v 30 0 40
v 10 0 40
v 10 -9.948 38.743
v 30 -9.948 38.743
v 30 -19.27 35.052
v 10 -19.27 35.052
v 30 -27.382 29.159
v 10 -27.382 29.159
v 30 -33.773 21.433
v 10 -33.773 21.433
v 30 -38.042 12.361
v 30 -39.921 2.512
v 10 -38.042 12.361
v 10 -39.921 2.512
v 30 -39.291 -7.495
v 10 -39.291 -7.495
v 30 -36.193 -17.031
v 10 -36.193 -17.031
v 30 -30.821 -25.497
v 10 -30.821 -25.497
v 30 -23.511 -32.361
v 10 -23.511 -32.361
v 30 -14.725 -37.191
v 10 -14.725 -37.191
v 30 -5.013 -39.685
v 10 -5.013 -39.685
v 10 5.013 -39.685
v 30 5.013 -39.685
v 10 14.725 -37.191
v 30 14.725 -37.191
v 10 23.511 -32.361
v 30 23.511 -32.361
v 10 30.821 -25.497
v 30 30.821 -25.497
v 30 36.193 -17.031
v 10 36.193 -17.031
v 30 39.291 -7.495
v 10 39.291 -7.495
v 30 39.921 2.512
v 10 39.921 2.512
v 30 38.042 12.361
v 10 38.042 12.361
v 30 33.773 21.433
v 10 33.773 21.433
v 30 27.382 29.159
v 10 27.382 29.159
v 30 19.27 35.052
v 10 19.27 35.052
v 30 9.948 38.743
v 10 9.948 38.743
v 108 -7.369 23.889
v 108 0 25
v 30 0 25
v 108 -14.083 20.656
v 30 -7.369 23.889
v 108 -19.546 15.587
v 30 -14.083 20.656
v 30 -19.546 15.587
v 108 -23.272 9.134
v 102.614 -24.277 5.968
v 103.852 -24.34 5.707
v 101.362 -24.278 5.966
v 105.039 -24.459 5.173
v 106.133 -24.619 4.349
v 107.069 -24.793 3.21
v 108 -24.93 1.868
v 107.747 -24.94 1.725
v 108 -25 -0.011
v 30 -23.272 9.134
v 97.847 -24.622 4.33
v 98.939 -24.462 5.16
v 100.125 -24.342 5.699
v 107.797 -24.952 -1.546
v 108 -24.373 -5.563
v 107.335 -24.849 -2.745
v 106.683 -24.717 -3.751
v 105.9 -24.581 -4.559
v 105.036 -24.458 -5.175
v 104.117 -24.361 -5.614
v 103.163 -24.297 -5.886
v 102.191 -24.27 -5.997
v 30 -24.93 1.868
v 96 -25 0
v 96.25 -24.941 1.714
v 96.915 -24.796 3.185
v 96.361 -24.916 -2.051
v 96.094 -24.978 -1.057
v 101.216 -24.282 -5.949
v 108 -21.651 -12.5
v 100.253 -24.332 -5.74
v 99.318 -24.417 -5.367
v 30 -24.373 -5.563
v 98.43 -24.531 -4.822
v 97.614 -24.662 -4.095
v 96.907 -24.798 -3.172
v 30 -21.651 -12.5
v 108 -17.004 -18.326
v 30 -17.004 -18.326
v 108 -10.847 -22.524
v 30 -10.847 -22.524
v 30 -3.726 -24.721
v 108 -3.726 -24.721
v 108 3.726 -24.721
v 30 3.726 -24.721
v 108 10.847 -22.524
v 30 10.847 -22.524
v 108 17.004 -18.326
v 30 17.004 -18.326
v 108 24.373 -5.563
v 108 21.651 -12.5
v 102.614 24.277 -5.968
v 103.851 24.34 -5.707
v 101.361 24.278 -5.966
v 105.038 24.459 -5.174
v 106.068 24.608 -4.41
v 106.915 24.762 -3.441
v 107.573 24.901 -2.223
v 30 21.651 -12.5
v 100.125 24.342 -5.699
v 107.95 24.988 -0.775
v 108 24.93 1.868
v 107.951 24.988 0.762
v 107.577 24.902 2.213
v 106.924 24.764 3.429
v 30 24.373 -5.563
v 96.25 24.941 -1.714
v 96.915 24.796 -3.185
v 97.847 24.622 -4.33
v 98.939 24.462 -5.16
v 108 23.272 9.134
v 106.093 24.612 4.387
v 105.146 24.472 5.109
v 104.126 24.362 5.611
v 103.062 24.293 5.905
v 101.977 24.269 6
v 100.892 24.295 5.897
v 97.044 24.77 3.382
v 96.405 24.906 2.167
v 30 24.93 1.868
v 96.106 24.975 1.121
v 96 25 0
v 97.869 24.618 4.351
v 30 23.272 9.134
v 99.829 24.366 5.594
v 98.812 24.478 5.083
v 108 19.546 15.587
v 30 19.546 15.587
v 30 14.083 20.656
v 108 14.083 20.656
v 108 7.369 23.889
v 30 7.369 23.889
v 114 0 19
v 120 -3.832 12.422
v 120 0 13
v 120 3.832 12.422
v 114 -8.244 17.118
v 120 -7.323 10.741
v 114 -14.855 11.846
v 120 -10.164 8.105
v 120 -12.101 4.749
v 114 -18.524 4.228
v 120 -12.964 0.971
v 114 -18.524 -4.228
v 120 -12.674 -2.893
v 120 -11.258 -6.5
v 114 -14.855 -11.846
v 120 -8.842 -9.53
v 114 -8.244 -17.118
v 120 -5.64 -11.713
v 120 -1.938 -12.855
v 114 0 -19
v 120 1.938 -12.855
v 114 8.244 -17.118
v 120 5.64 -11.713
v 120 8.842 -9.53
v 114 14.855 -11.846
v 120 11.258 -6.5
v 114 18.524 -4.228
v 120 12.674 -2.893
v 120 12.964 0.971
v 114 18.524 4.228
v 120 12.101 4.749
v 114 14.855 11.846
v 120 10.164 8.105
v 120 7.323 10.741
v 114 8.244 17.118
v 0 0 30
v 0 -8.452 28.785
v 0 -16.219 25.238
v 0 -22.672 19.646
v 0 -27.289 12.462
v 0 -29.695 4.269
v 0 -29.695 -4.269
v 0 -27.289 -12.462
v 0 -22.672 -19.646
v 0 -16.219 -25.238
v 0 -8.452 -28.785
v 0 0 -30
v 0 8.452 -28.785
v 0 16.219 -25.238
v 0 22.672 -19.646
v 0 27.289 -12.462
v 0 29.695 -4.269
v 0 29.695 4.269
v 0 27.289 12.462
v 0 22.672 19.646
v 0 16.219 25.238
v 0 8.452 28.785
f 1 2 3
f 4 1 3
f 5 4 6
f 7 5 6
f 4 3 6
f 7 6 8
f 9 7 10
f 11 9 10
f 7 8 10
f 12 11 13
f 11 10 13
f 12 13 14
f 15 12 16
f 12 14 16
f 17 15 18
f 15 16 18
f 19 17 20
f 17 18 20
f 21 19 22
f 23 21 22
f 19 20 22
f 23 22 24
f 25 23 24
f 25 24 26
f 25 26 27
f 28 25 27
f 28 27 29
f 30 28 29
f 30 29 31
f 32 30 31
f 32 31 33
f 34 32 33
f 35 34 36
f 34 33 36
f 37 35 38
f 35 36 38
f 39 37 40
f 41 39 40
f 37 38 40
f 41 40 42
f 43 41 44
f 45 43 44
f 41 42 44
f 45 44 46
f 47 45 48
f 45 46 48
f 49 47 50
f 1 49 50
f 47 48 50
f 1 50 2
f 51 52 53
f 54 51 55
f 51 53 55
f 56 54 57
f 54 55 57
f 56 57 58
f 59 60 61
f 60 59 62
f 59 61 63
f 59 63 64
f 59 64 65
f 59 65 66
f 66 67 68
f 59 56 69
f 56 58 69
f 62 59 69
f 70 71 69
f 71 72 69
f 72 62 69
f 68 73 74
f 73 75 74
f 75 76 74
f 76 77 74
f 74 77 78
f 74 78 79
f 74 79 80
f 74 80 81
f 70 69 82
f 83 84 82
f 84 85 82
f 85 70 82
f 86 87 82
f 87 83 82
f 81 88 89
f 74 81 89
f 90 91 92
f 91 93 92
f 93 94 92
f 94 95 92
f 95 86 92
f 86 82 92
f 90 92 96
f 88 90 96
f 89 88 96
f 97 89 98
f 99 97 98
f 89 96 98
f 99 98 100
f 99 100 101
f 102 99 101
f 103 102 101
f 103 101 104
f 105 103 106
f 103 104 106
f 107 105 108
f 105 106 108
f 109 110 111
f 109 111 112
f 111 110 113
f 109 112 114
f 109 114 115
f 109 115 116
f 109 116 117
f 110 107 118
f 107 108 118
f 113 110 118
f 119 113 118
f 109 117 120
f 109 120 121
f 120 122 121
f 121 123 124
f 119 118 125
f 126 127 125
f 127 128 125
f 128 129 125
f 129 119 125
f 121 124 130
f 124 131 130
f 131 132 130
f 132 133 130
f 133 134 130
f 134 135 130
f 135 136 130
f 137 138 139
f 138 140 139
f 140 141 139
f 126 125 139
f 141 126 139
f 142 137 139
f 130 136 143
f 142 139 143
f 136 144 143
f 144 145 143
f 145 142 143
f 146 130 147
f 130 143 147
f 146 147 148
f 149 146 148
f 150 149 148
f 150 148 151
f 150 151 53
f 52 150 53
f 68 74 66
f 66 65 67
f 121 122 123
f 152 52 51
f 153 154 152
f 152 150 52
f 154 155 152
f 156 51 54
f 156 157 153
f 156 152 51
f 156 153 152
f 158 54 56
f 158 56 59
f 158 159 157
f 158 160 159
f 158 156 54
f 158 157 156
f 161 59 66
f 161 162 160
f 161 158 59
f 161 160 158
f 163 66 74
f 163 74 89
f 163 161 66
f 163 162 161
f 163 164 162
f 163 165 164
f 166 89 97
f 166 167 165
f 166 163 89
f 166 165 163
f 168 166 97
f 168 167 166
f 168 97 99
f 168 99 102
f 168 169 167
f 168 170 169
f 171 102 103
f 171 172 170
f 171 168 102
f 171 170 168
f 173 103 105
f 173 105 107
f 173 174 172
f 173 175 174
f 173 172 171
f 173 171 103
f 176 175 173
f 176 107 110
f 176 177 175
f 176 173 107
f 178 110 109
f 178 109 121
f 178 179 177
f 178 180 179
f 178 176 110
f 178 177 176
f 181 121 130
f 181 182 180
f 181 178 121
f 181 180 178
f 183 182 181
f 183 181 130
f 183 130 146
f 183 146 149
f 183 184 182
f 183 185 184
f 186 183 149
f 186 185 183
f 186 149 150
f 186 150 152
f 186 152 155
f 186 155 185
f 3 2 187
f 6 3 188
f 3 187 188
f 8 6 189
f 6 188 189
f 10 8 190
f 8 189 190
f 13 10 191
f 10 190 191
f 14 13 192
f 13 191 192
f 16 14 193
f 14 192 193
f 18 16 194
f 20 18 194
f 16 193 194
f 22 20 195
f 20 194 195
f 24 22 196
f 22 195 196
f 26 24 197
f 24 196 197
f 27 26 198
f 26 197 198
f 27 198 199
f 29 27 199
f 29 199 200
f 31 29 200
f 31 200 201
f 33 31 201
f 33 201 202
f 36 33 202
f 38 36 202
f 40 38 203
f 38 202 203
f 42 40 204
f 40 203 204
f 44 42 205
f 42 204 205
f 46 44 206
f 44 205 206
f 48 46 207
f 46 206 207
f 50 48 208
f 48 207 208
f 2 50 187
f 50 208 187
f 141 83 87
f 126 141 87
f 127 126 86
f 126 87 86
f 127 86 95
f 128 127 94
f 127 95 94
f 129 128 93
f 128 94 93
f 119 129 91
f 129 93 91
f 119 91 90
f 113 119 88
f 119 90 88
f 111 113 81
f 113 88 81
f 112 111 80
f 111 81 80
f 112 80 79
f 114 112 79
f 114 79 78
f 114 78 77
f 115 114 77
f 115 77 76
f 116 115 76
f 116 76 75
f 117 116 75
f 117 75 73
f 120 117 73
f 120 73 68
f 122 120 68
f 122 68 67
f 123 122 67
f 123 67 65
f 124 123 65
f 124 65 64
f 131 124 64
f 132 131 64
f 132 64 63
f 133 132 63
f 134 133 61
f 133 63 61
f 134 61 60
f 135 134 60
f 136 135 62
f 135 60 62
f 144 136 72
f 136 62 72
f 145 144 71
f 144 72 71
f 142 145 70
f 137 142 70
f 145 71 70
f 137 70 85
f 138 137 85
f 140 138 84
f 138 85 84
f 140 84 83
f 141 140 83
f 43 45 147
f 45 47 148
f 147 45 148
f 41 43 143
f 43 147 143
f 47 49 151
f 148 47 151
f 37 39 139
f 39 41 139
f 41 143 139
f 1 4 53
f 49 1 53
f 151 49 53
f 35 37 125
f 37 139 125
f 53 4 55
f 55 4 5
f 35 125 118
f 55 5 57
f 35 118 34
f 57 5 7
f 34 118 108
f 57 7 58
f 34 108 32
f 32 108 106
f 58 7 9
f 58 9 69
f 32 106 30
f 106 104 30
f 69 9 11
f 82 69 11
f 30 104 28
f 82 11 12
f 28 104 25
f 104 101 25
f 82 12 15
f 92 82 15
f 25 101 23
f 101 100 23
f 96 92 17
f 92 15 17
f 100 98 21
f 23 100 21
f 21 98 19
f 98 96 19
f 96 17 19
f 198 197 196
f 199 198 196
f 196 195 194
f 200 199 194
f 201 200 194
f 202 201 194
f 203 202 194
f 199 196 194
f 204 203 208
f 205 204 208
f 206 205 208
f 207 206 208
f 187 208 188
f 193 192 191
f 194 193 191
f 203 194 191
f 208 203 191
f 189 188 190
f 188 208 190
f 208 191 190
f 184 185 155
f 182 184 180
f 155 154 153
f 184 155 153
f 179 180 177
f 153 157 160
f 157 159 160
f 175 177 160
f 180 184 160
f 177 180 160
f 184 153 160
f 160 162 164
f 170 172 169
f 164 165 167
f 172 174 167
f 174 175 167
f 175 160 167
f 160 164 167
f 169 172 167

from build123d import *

# Parameters (mm, degrees)
F2_SIZE2 = 10
F2_SIZE  = 10
F3_DEPTH = 25
F4_SIZE2 = 12
F4_SIZE  = 12


with BuildPart() as f1:
    # F0 (on Front) → F1 (revolve)
    with BuildSketch(Plane.XZ):
        Polygon((0, 40), (0, 0), (30, 0), (30, 25), (30, 40), align=None)
        with BuildLine():
            Line((30, 25), (30, 0))
            Line((30, 0), (96, 0))
            ThreePointArc((96, 0), (102, 6), (108, 0))
            Line((108, 0), (120, 0))
            Line((120, 0), (120, 25))
            Line((120, 25), (30, 25))
        make_face()
        with BuildLine():
            ThreePointArc((108, 0), (102, 6), (96, 0))
            Line((96, 0), (108, 0))
        make_face()
        with BuildLine():
            Line((108, 0), (96, 0))
            ThreePointArc((96, 0), (102, -6), (108, 0))
        make_face()
    revolve(axis=Axis((75, 0, 0), (1, 0, 0)))

    # F2
    f2_edges = [f1.edges().sort_by_distance(p)[0] for p in [
        (0, 0, -40),
    ]]
    chamfer(f2_edges, length=F2_SIZE, length2=F2_SIZE2)

    # F0 (on Front) → F3 (cut, symmetric)
    with BuildSketch(Plane.XZ):
        with BuildLine():
            ThreePointArc((108, 0), (102, 6), (96, 0))
            Line((96, 0), (108, 0))
        make_face()
        with BuildLine():
            Line((108, 0), (96, 0))
            ThreePointArc((96, 0), (102, -6), (108, 0))
        make_face()
    extrude(amount=F3_DEPTH, both=True, mode=Mode.SUBTRACT)

    # F4
    f4_edges = [f1.edges().sort_by_distance(p)[0] for p in [
        (120, 0, -25),
    ]]
    chamfer(f4_edges, length=F4_SIZE, length2=F4_SIZE2)


solid = f1.part
